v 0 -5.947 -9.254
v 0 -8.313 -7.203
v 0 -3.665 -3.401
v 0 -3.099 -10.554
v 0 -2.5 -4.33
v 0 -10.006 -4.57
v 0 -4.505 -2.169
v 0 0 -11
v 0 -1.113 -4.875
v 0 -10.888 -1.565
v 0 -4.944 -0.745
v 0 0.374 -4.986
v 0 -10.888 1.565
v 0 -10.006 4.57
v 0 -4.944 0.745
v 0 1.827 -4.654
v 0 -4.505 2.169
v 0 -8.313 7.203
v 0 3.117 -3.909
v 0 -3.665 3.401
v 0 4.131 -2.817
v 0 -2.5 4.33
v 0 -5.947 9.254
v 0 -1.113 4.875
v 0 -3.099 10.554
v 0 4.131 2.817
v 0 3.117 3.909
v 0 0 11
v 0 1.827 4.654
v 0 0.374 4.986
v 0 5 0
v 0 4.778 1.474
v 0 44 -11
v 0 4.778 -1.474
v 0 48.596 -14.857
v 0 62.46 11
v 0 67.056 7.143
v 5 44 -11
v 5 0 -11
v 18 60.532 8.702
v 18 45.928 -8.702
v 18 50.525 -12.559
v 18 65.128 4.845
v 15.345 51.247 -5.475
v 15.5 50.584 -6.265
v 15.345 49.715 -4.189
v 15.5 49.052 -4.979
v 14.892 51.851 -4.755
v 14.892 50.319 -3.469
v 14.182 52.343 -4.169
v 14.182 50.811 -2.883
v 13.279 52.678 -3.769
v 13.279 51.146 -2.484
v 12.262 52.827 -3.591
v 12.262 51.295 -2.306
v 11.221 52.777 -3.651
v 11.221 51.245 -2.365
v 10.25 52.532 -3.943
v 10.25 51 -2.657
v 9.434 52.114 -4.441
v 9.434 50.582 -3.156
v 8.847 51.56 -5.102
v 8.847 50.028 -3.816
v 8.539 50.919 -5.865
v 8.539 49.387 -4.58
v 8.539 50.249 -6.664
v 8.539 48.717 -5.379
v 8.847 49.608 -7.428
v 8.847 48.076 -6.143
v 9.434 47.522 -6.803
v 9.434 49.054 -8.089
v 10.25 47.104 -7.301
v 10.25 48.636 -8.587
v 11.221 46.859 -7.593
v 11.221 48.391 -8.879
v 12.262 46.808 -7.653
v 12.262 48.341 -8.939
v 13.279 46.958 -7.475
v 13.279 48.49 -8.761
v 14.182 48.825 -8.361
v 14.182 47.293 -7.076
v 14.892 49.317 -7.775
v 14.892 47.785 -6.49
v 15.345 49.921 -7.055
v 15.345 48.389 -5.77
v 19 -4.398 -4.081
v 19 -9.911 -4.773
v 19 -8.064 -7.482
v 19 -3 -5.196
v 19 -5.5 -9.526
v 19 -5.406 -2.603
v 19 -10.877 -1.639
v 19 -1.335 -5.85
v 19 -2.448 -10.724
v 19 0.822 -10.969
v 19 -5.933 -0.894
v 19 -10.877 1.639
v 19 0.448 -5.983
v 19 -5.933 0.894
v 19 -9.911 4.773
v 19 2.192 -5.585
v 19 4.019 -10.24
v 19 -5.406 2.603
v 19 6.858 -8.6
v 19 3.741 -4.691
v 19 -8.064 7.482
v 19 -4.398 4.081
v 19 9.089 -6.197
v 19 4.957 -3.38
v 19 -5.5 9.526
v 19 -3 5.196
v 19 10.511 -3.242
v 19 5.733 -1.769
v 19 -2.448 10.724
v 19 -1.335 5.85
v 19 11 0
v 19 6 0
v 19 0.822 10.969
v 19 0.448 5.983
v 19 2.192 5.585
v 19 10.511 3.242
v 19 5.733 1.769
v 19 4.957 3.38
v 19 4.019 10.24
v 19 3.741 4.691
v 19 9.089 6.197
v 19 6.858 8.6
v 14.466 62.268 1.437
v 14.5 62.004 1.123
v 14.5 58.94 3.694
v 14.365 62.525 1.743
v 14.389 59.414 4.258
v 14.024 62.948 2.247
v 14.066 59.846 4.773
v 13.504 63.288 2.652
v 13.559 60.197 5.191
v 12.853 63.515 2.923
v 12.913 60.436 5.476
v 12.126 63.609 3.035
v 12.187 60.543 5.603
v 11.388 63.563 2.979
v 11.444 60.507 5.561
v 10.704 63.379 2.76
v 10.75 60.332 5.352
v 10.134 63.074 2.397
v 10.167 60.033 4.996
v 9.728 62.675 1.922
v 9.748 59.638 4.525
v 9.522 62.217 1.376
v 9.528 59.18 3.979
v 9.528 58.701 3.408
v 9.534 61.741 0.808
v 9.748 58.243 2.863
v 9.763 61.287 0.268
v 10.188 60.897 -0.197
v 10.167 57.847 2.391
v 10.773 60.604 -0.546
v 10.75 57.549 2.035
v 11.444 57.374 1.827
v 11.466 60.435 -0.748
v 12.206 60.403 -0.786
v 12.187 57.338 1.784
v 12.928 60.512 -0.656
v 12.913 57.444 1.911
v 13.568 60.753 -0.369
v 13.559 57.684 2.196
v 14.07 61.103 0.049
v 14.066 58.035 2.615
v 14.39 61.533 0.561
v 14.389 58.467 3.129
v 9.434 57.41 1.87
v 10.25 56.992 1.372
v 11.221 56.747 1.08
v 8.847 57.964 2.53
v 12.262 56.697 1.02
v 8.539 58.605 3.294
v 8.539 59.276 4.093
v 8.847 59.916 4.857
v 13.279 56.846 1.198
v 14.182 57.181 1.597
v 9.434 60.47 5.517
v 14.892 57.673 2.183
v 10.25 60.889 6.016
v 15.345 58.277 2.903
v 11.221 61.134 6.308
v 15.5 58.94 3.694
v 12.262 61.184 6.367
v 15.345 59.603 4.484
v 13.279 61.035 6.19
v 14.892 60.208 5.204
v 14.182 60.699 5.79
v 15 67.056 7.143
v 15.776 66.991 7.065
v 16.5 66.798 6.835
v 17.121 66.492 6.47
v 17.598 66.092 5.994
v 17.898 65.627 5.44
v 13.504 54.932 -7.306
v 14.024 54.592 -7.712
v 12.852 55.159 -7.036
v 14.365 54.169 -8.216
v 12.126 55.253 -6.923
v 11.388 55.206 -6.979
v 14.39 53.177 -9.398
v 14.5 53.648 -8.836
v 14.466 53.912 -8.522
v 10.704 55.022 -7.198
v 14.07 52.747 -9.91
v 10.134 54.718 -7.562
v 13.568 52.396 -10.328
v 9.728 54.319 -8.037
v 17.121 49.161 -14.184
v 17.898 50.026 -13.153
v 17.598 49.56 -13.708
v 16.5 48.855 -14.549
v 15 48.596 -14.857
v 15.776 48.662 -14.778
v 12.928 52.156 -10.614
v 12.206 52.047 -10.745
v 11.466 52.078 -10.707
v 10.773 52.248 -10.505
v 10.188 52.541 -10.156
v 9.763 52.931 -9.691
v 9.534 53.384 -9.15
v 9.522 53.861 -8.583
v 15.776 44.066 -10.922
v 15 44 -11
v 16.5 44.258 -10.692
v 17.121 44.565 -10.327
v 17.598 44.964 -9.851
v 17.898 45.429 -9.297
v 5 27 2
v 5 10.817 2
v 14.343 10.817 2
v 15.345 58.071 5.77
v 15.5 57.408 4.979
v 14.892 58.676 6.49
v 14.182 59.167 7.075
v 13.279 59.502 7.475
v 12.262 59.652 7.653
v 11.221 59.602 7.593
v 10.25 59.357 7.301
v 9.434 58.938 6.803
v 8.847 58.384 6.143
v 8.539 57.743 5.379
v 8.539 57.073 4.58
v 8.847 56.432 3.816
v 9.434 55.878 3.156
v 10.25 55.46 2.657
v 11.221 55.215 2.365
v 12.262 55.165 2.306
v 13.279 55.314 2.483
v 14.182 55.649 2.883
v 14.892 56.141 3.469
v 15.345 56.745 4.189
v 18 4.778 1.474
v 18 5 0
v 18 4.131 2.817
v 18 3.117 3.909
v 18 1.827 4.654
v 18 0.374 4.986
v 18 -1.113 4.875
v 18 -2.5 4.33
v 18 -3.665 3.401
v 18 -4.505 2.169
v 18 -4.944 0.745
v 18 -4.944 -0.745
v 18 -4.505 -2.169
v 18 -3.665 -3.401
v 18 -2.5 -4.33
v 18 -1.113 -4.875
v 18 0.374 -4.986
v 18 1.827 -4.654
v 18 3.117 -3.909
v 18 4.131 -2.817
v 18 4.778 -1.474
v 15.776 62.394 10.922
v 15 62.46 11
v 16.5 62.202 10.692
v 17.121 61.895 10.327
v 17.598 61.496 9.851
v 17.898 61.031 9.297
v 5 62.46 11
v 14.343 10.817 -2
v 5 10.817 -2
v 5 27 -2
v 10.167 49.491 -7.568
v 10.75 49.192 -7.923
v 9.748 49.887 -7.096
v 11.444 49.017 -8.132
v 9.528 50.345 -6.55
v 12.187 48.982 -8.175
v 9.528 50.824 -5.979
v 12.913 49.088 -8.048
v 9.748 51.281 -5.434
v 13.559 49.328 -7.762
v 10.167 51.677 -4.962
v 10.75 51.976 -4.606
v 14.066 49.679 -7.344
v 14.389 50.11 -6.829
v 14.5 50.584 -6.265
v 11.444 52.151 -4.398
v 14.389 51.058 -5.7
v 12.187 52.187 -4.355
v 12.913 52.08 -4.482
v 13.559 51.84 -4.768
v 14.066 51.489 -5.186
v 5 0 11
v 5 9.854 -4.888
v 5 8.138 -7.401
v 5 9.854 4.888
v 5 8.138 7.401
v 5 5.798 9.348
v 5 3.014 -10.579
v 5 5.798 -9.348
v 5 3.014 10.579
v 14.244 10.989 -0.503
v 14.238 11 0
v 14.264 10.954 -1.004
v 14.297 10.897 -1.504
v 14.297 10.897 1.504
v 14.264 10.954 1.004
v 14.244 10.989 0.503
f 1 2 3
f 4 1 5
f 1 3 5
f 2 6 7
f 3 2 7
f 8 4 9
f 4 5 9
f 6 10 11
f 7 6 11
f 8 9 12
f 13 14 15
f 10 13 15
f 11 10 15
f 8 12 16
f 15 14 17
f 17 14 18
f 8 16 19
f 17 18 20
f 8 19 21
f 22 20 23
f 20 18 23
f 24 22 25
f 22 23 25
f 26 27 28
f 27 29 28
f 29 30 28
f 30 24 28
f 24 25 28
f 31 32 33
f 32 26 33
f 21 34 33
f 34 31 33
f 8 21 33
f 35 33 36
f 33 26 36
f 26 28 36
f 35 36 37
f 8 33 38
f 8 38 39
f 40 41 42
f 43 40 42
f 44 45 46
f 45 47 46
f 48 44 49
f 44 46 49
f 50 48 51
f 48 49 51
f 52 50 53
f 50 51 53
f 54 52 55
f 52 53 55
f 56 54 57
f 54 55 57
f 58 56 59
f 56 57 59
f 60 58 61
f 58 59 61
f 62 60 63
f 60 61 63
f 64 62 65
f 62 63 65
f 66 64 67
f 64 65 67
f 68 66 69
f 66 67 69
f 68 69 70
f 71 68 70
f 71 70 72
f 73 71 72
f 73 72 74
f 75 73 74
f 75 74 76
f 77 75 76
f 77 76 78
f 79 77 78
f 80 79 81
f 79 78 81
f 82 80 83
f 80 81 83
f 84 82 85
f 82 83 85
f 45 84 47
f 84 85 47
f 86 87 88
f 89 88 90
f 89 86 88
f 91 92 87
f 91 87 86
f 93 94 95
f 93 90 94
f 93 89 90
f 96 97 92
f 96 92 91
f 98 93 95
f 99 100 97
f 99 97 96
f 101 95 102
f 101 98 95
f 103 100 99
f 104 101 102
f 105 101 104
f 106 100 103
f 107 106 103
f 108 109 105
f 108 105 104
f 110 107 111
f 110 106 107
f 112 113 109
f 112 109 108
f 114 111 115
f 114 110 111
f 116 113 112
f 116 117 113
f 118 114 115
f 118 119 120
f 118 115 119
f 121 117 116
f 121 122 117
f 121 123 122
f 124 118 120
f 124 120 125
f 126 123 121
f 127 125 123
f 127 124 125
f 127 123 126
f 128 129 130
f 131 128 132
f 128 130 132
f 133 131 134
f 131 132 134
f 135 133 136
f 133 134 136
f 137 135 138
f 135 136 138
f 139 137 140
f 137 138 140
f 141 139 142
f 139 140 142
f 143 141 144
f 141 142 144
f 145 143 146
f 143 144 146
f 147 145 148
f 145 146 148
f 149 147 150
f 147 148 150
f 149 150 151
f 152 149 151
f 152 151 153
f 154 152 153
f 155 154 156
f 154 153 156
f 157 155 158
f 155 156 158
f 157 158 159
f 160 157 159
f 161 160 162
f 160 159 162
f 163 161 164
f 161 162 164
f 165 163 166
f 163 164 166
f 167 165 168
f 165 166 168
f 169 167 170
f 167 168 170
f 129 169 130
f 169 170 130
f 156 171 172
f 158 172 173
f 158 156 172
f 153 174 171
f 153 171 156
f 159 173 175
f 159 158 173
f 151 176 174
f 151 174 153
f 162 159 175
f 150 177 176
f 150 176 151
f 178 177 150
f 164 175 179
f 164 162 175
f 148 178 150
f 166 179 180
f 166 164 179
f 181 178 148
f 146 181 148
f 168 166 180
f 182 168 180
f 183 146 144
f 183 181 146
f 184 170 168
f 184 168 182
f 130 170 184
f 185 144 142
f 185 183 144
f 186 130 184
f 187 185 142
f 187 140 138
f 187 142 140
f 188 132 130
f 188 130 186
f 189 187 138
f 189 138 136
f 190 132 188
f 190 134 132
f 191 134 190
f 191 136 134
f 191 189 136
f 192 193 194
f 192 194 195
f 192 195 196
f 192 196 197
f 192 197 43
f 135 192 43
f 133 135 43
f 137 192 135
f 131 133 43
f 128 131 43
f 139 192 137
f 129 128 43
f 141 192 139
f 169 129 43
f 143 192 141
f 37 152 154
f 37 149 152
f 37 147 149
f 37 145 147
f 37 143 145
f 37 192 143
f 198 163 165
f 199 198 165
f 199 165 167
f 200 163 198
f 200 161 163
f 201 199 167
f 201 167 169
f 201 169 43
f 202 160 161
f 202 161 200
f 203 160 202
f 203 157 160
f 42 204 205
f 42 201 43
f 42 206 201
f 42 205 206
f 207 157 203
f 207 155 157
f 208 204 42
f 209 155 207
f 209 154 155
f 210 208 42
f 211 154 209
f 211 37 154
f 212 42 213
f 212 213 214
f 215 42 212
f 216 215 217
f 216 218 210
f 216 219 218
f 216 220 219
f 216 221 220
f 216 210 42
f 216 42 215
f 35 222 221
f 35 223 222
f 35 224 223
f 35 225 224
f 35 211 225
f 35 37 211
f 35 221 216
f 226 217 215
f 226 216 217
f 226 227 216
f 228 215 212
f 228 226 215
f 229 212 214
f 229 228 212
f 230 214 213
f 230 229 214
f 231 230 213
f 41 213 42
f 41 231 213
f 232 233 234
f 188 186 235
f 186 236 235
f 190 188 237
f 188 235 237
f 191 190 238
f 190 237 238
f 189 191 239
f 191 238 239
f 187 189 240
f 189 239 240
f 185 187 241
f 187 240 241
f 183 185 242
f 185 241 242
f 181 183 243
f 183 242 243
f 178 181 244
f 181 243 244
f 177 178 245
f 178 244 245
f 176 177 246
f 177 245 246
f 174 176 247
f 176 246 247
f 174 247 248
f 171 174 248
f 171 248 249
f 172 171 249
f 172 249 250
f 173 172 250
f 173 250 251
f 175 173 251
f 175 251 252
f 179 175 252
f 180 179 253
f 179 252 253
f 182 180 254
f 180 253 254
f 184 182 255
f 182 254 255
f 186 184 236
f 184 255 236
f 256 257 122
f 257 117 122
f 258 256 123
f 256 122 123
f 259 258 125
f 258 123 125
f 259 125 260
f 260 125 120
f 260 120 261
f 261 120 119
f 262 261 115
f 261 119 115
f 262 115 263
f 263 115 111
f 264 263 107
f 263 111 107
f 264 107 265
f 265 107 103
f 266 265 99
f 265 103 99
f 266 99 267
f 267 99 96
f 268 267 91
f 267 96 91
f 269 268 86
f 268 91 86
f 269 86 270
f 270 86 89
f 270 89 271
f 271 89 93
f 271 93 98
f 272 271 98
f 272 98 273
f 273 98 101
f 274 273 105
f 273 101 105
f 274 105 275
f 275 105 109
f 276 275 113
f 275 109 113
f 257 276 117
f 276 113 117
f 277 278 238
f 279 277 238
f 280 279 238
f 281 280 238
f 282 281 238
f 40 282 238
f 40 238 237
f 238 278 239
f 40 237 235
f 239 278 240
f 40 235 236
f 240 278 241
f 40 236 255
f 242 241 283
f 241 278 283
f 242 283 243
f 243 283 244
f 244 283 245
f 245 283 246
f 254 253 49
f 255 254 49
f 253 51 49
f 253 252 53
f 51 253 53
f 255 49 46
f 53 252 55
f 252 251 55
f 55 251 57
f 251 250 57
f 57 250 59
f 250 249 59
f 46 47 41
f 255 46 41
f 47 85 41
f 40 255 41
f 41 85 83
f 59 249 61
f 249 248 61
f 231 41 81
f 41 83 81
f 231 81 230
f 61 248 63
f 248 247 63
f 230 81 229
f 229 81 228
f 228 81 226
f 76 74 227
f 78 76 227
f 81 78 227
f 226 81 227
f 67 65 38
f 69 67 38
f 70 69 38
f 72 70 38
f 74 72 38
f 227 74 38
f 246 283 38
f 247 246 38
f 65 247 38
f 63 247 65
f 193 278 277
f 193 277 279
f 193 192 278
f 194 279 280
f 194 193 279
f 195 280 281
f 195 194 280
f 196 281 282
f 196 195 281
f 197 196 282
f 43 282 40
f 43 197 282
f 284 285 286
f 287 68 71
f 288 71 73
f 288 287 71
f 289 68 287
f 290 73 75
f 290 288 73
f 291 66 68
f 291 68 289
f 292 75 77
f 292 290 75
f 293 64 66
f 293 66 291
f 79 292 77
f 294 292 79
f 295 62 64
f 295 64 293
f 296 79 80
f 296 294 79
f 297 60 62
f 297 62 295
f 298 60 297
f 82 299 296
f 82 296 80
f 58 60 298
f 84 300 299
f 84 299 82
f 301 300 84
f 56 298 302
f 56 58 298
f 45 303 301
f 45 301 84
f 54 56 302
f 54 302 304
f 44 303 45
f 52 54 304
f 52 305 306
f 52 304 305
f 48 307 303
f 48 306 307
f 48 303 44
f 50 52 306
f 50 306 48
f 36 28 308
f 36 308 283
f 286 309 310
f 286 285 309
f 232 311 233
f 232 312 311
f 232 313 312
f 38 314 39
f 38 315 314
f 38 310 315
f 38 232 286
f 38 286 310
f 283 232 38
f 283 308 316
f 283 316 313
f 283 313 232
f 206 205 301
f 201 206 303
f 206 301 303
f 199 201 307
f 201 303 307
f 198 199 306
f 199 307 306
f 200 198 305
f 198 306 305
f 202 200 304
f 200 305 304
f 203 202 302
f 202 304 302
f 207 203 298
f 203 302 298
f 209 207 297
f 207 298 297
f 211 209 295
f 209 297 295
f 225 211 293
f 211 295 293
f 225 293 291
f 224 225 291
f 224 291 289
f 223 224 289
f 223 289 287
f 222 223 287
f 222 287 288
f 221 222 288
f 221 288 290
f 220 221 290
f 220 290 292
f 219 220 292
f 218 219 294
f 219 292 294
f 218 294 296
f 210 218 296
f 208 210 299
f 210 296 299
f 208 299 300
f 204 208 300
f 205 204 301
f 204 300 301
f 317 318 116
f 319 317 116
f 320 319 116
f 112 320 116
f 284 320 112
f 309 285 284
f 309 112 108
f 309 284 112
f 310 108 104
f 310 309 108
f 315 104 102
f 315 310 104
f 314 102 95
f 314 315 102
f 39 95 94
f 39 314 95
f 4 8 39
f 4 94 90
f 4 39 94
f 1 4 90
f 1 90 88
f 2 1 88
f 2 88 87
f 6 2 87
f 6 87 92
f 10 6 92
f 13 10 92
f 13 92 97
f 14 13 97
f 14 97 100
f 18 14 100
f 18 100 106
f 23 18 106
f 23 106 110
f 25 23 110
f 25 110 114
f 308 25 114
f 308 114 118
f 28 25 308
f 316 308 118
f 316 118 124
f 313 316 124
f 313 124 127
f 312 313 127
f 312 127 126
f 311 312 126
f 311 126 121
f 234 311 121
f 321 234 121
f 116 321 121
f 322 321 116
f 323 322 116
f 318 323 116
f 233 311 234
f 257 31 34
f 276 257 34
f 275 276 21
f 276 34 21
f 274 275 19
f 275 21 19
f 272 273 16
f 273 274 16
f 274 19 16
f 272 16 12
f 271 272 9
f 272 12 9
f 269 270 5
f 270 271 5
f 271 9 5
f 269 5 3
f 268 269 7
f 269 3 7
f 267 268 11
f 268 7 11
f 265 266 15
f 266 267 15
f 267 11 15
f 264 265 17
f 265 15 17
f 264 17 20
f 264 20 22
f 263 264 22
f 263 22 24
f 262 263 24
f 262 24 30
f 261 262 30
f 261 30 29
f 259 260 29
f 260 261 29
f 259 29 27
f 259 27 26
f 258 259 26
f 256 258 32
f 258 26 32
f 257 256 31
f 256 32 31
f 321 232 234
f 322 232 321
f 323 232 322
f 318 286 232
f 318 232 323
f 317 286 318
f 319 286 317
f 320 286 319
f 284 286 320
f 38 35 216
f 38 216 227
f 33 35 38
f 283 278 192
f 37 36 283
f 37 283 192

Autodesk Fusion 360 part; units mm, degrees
sketch "草图1" plane through (0, 0, 0) normal (1, 0, 0) x (0, 1, 0)
  circle A0 centre (0, 0) radius 5
  circle A1 centre (0, 0) radius 11
  line L0 (0, 11) -> (62.4602, 11)
  line L1 (62.4602, 11) -> (44, -11)
  line L2 (44, -11) -> (0, -11)
  line L3 (62.4602, 11) -> (67.0565, 7.1433)
  line L4 (67.0565, 7.1433) -> (48.5963, -14.8567)
  line L5 (48.5963, -14.8567) -> (44, -11)
  dimension "d1" = 22
  dimension "d2" = 10
  dimension "d3" = 44
  dimension "d4" = 130
  dimension "d5" = 6
extrude "拉伸1" add sketch "草图1" along normal blind 19 contours A1 makes body 1
extrude "拉伸2" add sketch "草图1" along normal blind 5 contours A1 L0 L1 L2 bodies 1
extrude "拉伸3" add sketch "草图1" along normal blind 18 contours L1 L3 L4 L5 bodies 1
fillet "圆角1" radius 3 2 edges at (18, 64.7583, 9.0716) (18, 46.2981, -12.9284) on bodies 1
chamfer "倒角1" distance 1 angle 45 1 edges at (19, -4.6616, 1.8081) on bodies 1
sketch "草图2" plane through (0, 31.2367, -26.2107) normal (0, -0.766, 0.6428) x (1, 0, 0)
  arc A0 (15, 19.8562) -> (18, 22.8562) centre (15, 22.8562) ccw
  line L0 (18, 22.8562) -> (18, 45.5751)
  arc A1 (18, 45.5751) -> (15, 48.5751) centre (15, 45.5751) ccw
  line L1 (15, 48.5751) -> (5, 48.5751)
  line L2 (5, 48.5751) -> (5, 19.8562)
  line L3 (5, 19.8562) -> (15, 19.8562)
  line L4 (18, 34.2156) -> (5, 34.2156) construction
  circle A2 centre (12, 40.7156) radius 3.5
  circle A3 centre (12, 40.7156) radius 2.5
  circle A4 centre (12, 27.7156) radius 3.5
  circle A5 centre (12, 27.7156) radius 2.5
  dimension "d15" = 7
  dimension "d16" = 5
  dimension "d17" = 6
  dimension "d18" = 13
extrude "拉伸4" cut sketch "草图2" against normal blind 2 contours A2 | A4 bodies 1
extrude "拉伸5" cut 2 faces at (13.1784, 57.6864, 5.3108) (12.6885, 49.3537, -4.6197) along direction (0, 0.766044, -0.642788) blind 50 on bodies 1 bodies 1
sketch "草图3" plane through (0, 0, 0) normal (0, 0, 1) x (1, 0, 0)
  line L0 (5, 27) -> (20.5885, 0)
  line L1 (20.5885, 0) -> (5, 0)
  line L2 (5, 0) -> (5, 27)
  dimension "d23" = 5
  dimension "d24" = 27
  dimension "d25" = 30
extrude "拉伸6" add sketch "草图3" along normal mid plane 4 separate body makes body 2
extrude "拉伸7" cut sketch "草图1" along normal blind 43 contours A0 bodies 2
combine "合并1" operation add target body 1 tool bodies 2
